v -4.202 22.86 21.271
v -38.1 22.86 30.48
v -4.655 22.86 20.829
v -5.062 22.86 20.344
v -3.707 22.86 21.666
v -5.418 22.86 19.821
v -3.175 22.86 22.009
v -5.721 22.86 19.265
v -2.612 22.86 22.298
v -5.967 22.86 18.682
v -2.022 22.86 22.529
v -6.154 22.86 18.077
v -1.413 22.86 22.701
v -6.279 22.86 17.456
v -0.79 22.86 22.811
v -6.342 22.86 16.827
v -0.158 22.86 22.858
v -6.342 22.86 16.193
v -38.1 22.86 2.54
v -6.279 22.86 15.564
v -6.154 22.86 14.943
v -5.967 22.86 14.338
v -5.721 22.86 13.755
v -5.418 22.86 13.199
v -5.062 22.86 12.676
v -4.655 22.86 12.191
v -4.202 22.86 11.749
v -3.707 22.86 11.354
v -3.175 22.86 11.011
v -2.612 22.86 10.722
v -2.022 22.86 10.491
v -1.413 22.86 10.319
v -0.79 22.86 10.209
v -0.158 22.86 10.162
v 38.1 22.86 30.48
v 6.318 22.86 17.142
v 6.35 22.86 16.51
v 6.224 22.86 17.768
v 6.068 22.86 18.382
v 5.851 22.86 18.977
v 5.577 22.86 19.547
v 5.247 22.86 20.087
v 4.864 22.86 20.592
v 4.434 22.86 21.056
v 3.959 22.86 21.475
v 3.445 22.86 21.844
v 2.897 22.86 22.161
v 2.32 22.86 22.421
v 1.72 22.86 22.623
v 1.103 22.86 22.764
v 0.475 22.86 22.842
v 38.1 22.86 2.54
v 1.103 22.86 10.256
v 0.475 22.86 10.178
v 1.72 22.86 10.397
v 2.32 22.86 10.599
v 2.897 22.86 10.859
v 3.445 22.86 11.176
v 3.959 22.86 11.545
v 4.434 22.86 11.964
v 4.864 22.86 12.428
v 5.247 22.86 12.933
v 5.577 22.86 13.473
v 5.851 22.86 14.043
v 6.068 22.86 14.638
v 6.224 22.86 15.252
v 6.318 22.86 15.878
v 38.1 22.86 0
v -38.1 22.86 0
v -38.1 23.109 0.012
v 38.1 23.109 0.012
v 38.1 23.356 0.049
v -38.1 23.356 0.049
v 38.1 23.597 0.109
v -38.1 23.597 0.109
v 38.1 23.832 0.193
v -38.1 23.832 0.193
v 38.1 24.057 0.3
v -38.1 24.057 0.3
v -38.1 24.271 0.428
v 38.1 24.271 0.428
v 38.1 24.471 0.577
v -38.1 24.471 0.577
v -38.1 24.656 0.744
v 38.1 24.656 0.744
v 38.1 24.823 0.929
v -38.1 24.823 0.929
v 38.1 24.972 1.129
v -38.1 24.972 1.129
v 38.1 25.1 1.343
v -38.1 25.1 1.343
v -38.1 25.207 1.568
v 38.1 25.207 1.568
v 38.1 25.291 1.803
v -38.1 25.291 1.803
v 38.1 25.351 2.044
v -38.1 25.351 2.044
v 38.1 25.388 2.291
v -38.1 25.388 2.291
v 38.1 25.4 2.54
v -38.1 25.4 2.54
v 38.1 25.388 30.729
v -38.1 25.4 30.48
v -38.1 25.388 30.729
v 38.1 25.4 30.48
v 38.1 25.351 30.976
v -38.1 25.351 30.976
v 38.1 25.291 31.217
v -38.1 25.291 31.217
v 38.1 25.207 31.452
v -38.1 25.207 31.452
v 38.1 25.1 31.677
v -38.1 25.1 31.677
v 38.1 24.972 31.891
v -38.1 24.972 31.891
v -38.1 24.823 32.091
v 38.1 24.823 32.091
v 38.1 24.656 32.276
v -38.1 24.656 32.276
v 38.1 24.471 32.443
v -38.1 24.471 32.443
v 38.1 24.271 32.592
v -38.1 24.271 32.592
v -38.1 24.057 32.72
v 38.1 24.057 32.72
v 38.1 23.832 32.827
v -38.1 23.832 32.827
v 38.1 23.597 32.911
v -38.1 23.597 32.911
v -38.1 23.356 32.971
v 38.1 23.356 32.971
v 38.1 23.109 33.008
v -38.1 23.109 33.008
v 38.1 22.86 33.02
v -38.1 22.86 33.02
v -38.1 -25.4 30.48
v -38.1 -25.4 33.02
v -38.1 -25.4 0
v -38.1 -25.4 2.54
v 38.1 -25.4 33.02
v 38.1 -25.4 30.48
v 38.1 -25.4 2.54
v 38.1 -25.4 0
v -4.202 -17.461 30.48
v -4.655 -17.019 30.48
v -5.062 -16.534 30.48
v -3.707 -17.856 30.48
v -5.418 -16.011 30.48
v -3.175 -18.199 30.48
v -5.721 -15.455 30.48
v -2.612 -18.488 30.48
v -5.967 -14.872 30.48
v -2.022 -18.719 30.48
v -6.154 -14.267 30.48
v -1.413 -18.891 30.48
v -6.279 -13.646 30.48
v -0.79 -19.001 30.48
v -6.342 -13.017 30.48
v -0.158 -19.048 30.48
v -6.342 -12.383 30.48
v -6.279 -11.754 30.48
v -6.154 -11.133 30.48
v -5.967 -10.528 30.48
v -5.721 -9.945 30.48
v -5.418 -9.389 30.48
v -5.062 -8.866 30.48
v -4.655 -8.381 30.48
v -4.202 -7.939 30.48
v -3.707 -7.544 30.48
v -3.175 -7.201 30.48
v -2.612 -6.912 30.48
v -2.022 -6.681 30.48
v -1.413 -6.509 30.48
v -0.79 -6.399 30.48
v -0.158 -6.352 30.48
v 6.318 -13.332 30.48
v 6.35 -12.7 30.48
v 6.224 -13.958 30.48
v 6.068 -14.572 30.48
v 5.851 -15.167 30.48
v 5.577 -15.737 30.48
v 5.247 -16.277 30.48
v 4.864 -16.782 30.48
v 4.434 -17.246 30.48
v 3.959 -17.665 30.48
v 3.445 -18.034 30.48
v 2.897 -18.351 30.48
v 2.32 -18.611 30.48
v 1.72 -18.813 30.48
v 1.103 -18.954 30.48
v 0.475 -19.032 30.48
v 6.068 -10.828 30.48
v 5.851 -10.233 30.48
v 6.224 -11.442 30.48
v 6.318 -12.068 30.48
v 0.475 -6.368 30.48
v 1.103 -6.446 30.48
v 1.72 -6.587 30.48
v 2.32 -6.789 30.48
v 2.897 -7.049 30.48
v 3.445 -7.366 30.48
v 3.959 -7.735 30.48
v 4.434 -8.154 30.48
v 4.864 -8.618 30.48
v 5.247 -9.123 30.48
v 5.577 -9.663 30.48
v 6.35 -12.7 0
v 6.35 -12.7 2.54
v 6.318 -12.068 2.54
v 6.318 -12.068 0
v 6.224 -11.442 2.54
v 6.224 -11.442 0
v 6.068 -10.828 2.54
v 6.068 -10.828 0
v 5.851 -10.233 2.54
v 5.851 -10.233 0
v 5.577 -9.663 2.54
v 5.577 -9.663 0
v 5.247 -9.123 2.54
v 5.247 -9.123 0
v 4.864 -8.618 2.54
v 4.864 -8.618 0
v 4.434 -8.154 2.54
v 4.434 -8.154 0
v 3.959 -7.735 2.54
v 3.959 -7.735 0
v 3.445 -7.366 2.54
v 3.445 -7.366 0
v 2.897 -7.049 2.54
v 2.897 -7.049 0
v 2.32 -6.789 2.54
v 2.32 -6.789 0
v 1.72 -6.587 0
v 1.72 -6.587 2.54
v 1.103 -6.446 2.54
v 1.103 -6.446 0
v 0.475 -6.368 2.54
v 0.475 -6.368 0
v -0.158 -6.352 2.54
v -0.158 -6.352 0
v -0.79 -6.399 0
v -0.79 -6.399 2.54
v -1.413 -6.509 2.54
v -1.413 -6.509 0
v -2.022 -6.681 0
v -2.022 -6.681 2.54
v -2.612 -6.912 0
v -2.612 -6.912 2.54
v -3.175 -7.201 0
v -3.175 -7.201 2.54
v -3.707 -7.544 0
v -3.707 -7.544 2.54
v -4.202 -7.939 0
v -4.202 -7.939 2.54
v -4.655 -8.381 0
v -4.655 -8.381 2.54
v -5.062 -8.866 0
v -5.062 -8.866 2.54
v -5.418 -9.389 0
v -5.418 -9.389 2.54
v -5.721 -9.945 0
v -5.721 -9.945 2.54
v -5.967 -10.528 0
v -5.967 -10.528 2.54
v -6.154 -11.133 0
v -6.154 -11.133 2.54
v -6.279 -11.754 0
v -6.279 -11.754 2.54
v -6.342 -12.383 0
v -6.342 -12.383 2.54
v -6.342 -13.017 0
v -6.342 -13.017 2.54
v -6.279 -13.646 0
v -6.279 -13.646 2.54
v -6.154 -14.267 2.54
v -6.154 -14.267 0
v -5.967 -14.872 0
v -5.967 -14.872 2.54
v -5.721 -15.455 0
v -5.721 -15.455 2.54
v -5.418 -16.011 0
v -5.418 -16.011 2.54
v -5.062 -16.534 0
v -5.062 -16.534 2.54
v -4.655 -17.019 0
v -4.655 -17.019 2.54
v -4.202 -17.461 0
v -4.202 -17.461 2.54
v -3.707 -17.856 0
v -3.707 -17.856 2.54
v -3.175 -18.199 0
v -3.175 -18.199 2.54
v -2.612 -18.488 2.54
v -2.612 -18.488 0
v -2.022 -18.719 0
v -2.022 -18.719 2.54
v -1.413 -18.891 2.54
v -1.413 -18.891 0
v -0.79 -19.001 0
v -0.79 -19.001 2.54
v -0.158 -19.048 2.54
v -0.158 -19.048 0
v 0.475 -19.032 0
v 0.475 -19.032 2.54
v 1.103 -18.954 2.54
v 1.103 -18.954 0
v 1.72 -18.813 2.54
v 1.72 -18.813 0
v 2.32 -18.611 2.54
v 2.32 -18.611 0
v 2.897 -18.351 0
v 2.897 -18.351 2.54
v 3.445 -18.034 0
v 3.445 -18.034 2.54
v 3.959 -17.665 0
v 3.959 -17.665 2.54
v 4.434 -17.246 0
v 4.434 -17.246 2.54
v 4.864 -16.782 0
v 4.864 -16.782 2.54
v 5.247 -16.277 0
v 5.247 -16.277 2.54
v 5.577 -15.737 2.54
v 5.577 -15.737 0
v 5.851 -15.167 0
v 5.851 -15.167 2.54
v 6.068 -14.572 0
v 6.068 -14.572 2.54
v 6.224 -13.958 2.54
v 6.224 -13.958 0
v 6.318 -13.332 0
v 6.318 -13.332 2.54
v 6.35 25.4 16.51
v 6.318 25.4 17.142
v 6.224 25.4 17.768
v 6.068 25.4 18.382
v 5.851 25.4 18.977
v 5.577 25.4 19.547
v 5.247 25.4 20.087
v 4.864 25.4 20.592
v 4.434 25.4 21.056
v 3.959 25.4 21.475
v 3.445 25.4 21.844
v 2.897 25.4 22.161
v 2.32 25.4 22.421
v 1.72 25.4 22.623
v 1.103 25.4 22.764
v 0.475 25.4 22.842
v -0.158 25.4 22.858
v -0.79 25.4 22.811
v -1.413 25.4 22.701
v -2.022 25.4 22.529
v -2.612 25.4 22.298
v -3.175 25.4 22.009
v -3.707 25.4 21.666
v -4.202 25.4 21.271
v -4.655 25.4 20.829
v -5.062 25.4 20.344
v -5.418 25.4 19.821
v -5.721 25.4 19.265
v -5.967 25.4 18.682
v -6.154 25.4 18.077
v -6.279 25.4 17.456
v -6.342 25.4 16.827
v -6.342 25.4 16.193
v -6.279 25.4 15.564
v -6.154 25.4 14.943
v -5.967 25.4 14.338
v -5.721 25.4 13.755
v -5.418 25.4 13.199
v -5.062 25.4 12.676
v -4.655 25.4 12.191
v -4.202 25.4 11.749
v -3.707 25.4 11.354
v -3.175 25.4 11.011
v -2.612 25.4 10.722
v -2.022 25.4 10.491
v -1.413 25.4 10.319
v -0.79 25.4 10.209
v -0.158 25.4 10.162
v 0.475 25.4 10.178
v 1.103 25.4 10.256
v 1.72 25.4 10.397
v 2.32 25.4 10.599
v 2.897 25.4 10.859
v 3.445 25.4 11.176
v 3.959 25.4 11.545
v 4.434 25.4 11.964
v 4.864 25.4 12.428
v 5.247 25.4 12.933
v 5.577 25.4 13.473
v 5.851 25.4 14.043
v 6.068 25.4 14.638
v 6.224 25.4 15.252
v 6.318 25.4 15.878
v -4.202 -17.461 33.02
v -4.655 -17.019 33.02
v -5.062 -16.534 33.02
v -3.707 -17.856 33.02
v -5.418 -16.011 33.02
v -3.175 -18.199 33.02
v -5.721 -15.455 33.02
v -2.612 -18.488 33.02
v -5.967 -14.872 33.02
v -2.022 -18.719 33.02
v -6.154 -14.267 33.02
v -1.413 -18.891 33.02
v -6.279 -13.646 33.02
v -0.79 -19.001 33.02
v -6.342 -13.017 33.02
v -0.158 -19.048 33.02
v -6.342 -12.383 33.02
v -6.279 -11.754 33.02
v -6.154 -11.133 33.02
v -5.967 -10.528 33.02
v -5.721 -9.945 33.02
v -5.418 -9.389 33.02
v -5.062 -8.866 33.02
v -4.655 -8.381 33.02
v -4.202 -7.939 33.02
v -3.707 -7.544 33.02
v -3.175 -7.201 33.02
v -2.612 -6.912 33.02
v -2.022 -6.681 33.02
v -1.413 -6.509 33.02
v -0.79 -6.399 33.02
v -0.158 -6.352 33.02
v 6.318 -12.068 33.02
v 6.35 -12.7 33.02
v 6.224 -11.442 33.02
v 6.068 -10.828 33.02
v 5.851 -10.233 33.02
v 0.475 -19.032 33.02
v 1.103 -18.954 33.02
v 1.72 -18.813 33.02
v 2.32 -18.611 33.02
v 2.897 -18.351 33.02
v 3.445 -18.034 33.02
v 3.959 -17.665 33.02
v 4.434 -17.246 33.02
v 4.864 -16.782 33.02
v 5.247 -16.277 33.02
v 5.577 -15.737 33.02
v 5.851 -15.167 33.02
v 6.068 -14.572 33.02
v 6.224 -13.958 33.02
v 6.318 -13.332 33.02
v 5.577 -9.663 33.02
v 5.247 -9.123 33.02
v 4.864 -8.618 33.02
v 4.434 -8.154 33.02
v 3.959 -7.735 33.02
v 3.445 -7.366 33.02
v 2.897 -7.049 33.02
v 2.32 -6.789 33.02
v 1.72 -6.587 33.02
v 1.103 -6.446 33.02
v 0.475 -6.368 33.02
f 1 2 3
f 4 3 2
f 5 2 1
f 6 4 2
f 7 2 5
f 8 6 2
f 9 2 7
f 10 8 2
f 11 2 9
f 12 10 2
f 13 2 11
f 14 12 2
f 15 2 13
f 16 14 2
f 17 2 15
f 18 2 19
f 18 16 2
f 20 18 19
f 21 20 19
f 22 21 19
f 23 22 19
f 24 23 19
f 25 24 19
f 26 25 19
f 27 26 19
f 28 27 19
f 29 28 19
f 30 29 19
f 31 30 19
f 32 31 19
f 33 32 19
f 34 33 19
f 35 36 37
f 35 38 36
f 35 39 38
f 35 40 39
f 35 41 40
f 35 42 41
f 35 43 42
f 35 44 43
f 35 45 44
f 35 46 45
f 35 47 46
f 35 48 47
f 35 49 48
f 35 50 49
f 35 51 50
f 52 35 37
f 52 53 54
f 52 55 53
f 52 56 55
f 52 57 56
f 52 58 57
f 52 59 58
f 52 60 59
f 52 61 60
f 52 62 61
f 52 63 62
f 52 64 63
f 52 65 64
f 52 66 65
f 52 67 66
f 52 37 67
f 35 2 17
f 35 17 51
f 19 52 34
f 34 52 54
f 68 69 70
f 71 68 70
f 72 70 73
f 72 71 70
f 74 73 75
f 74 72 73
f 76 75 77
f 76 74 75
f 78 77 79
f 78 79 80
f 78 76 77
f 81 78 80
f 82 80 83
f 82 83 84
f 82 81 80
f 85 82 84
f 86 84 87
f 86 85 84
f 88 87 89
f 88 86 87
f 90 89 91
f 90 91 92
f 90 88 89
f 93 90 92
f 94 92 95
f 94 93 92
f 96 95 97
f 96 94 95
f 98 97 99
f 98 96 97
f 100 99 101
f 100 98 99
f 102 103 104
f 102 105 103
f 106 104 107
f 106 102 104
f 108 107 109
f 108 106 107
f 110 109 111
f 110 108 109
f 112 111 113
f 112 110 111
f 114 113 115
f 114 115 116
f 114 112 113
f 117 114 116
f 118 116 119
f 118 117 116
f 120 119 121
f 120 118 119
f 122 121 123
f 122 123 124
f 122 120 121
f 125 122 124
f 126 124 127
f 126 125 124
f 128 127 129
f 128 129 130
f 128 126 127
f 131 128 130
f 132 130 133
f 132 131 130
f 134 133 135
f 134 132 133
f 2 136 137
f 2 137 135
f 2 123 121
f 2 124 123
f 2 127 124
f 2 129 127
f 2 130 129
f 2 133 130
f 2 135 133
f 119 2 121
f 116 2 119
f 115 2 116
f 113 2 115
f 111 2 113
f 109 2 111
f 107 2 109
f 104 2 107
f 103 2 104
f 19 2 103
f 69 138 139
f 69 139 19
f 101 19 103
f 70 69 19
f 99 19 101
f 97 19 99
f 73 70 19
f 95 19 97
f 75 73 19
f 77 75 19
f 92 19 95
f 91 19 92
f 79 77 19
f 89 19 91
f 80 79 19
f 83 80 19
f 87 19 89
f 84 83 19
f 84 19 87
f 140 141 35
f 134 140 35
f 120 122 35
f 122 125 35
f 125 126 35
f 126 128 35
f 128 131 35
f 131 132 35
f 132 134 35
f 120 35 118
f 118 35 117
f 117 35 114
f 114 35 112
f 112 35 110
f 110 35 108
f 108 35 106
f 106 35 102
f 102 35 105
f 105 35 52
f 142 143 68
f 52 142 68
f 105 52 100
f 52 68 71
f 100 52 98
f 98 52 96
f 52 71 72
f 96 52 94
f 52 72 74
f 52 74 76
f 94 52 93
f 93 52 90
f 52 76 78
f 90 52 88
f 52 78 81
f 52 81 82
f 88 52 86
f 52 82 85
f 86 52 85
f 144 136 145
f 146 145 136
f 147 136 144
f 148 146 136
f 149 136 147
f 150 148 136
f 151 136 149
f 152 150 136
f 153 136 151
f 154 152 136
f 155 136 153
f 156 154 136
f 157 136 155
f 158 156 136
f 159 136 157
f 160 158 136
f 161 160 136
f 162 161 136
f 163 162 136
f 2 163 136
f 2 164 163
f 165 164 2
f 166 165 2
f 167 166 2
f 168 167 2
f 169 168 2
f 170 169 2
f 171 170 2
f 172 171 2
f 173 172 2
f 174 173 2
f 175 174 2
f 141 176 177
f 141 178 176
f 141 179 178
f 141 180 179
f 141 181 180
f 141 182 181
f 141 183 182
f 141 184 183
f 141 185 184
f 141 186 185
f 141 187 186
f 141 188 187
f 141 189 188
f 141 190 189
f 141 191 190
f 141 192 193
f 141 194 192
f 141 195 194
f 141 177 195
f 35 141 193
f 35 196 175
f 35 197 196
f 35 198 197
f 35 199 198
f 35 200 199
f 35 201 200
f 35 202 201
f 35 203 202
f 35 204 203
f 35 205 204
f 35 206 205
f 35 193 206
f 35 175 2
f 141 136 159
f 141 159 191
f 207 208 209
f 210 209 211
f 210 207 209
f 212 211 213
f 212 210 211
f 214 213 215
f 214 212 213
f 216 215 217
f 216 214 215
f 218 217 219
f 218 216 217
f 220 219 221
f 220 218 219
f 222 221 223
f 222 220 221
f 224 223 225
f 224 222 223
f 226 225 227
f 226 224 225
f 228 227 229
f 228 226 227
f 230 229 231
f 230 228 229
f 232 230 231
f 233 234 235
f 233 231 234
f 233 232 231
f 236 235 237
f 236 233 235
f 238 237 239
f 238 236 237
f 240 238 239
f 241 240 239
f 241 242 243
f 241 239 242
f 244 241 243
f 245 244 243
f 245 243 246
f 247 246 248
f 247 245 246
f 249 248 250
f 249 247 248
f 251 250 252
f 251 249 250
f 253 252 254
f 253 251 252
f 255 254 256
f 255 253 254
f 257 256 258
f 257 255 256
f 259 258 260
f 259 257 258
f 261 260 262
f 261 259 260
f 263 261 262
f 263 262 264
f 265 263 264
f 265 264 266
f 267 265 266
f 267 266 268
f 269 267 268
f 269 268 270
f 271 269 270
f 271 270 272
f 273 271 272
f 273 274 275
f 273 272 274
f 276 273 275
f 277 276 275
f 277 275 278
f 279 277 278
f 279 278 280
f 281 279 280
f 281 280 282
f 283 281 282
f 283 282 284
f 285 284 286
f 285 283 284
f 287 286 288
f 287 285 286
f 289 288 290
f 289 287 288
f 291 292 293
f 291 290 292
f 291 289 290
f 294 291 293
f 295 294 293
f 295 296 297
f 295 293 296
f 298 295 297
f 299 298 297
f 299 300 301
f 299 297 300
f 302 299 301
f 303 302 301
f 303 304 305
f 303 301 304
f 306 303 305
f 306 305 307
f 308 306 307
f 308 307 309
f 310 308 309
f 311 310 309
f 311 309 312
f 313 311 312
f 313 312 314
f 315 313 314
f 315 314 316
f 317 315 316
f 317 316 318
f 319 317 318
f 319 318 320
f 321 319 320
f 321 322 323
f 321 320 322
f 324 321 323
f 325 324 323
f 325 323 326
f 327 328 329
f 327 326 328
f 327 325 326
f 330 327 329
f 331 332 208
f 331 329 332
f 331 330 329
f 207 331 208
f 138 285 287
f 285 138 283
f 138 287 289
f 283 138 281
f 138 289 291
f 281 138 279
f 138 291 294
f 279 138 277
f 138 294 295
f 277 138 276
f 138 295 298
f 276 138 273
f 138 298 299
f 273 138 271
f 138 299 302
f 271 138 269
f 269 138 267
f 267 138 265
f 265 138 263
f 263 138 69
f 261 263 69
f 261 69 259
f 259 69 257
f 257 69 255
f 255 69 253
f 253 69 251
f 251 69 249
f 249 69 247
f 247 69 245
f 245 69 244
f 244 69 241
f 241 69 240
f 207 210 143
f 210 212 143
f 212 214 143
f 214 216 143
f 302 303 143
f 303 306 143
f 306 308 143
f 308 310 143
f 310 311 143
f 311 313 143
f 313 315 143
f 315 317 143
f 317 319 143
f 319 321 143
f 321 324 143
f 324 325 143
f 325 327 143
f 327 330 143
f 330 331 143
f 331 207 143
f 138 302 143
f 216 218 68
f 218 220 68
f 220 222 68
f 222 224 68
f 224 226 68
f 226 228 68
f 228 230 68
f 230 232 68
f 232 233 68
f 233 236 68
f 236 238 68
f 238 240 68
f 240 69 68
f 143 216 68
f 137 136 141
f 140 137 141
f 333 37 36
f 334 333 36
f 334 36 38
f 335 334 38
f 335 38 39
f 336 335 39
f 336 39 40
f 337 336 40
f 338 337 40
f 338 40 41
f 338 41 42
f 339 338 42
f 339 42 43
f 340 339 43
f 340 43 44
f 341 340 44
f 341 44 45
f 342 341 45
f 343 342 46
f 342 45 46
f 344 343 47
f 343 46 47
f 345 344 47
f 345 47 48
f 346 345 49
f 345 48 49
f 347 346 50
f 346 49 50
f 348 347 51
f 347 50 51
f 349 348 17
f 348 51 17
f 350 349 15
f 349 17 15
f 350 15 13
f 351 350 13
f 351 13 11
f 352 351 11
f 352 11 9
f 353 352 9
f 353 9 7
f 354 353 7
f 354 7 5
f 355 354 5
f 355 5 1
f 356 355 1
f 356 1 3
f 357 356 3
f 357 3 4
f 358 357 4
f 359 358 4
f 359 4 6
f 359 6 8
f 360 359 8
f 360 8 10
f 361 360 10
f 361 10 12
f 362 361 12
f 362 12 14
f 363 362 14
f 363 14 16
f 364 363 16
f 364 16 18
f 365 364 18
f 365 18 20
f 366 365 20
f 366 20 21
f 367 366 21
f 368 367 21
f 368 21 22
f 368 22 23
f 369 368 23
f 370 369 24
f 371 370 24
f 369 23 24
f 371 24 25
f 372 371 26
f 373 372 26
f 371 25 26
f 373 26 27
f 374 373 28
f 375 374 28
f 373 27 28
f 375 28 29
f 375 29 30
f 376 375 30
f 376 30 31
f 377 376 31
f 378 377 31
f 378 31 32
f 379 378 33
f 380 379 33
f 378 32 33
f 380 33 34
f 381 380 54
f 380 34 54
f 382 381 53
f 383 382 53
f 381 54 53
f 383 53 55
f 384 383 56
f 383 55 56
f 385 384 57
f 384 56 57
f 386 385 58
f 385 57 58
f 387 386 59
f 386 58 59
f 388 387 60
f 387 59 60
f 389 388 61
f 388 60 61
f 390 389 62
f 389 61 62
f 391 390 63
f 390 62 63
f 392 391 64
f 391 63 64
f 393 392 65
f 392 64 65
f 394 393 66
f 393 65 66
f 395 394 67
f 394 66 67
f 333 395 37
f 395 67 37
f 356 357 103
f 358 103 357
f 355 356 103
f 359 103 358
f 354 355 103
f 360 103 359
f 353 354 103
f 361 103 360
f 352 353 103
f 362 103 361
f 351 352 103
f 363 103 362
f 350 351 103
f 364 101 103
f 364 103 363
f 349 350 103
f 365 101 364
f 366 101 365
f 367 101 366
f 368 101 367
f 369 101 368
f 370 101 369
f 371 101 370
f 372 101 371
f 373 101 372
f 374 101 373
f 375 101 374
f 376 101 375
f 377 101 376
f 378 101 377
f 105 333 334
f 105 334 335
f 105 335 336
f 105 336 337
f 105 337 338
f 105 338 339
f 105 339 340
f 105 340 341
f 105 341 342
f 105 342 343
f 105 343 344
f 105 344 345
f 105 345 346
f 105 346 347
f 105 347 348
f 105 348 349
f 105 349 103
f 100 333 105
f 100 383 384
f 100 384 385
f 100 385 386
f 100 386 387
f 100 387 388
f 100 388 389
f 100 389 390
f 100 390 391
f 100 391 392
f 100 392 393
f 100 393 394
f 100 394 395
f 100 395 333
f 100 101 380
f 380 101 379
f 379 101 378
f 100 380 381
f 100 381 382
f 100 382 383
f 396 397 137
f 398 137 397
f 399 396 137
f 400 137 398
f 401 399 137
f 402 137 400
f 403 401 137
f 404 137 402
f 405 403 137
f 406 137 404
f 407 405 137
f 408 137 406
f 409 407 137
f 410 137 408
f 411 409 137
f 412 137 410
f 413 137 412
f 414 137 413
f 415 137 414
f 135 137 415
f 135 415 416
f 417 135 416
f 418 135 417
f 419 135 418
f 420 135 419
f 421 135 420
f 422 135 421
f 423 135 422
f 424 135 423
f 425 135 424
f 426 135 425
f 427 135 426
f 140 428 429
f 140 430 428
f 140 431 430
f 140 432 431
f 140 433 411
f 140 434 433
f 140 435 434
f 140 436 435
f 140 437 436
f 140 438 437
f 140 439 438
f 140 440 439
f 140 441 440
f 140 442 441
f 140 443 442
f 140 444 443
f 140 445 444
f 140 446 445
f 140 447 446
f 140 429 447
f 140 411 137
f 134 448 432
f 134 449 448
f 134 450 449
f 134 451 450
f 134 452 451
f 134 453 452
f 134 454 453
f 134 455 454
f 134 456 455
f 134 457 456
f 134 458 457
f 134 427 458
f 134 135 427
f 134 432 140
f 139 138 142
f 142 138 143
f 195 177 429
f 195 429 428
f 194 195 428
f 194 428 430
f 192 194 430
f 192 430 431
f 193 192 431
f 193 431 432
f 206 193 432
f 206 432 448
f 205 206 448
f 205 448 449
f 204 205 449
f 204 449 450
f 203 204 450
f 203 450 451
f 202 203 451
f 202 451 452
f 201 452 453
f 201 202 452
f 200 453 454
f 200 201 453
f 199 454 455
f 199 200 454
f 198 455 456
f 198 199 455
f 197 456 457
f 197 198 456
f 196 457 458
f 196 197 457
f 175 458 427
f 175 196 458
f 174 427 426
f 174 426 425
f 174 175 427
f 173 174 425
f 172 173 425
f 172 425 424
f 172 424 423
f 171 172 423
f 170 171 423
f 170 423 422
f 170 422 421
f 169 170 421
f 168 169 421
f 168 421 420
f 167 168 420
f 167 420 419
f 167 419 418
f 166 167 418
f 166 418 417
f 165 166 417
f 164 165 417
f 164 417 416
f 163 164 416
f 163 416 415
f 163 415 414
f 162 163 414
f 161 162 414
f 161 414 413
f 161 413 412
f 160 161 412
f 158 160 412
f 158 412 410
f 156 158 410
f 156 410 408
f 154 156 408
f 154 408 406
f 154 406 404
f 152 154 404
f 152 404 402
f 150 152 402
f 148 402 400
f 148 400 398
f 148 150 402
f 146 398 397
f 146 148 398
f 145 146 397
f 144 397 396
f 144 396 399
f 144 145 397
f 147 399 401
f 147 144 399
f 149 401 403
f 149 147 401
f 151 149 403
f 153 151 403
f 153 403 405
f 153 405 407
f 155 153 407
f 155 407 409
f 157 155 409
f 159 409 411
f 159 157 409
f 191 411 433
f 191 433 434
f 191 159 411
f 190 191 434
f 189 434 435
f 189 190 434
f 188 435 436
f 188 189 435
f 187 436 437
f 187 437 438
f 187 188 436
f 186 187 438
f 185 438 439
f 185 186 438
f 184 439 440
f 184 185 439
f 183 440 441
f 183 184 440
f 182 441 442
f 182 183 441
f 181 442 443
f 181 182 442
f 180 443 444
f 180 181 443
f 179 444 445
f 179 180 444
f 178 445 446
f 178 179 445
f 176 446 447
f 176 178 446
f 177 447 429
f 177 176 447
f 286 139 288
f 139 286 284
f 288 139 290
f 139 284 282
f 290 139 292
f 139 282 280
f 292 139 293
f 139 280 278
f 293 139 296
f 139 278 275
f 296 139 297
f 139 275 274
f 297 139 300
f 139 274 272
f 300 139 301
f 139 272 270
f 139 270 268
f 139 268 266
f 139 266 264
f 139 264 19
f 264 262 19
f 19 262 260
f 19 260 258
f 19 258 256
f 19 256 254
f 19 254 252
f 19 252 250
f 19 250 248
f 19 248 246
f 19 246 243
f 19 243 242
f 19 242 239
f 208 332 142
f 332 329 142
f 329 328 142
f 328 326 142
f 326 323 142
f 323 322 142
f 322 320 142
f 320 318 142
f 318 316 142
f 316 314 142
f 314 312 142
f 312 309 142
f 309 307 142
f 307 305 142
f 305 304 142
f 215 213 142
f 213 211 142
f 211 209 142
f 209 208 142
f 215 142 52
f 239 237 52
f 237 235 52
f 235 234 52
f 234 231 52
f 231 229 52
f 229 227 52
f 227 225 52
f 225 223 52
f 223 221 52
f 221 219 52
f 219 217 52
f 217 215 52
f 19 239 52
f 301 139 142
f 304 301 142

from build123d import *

# Parameters (mm, degrees)
SKETCH1_W           = 76.2
SKETCH1_H           = 50.8
SKETCH1_R           = 6.35
BOSS_EXTRUDE1_DEPTH = 33.02
SKETCH2_W           = 27.94
SKETCH2_H           = 60.96
CUT_EXTRUDE1_DEPTH  = 87.844230666
SKETCH3_R           = 6.35
CUT_EXTRUDE2_DEPTH  = 70.792248853
FILLET1_R           = 2.54


with BuildPart() as part:
    # Sketch1 → Boss-Extrude1 (new body)
    with BuildSketch(Plane.XY):
        Rectangle(SKETCH1_W, SKETCH1_H)
        with Locations((0, -12.7)):
            Circle(SKETCH1_R, mode=Mode.SUBTRACT)
    extrude(amount=BOSS_EXTRUDE1_DEPTH)

    # Sketch2 → Cut-Extrude1 (cut, through all)
    with BuildSketch(Plane(origin=(38.1, 0, 0), x_dir=(0, 0, -1), z_dir=(1, 0, 0))):
        with Locations((-16.51, -7.62)):
            Rectangle(SKETCH2_W, SKETCH2_H)
    extrude(amount=-CUT_EXTRUDE1_DEPTH, mode=Mode.SUBTRACT)

    # Sketch3 → Cut-Extrude2 (cut, through all)
    with BuildSketch(Plane.XZ.offset(-22.86)):
        with Locations((0, 16.51)):
            Circle(SKETCH3_R)
    extrude(amount=-CUT_EXTRUDE2_DEPTH, mode=Mode.SUBTRACT)

    # Fillet1
    fillet1_edges = [part.edges().sort_by_distance(p)[0] for p in [
        (0, 25.4, 0),
        (0, 25.4, 33.02),
    ]]
    fillet(fillet1_edges, radius=FILLET1_R)


solid = part.part
